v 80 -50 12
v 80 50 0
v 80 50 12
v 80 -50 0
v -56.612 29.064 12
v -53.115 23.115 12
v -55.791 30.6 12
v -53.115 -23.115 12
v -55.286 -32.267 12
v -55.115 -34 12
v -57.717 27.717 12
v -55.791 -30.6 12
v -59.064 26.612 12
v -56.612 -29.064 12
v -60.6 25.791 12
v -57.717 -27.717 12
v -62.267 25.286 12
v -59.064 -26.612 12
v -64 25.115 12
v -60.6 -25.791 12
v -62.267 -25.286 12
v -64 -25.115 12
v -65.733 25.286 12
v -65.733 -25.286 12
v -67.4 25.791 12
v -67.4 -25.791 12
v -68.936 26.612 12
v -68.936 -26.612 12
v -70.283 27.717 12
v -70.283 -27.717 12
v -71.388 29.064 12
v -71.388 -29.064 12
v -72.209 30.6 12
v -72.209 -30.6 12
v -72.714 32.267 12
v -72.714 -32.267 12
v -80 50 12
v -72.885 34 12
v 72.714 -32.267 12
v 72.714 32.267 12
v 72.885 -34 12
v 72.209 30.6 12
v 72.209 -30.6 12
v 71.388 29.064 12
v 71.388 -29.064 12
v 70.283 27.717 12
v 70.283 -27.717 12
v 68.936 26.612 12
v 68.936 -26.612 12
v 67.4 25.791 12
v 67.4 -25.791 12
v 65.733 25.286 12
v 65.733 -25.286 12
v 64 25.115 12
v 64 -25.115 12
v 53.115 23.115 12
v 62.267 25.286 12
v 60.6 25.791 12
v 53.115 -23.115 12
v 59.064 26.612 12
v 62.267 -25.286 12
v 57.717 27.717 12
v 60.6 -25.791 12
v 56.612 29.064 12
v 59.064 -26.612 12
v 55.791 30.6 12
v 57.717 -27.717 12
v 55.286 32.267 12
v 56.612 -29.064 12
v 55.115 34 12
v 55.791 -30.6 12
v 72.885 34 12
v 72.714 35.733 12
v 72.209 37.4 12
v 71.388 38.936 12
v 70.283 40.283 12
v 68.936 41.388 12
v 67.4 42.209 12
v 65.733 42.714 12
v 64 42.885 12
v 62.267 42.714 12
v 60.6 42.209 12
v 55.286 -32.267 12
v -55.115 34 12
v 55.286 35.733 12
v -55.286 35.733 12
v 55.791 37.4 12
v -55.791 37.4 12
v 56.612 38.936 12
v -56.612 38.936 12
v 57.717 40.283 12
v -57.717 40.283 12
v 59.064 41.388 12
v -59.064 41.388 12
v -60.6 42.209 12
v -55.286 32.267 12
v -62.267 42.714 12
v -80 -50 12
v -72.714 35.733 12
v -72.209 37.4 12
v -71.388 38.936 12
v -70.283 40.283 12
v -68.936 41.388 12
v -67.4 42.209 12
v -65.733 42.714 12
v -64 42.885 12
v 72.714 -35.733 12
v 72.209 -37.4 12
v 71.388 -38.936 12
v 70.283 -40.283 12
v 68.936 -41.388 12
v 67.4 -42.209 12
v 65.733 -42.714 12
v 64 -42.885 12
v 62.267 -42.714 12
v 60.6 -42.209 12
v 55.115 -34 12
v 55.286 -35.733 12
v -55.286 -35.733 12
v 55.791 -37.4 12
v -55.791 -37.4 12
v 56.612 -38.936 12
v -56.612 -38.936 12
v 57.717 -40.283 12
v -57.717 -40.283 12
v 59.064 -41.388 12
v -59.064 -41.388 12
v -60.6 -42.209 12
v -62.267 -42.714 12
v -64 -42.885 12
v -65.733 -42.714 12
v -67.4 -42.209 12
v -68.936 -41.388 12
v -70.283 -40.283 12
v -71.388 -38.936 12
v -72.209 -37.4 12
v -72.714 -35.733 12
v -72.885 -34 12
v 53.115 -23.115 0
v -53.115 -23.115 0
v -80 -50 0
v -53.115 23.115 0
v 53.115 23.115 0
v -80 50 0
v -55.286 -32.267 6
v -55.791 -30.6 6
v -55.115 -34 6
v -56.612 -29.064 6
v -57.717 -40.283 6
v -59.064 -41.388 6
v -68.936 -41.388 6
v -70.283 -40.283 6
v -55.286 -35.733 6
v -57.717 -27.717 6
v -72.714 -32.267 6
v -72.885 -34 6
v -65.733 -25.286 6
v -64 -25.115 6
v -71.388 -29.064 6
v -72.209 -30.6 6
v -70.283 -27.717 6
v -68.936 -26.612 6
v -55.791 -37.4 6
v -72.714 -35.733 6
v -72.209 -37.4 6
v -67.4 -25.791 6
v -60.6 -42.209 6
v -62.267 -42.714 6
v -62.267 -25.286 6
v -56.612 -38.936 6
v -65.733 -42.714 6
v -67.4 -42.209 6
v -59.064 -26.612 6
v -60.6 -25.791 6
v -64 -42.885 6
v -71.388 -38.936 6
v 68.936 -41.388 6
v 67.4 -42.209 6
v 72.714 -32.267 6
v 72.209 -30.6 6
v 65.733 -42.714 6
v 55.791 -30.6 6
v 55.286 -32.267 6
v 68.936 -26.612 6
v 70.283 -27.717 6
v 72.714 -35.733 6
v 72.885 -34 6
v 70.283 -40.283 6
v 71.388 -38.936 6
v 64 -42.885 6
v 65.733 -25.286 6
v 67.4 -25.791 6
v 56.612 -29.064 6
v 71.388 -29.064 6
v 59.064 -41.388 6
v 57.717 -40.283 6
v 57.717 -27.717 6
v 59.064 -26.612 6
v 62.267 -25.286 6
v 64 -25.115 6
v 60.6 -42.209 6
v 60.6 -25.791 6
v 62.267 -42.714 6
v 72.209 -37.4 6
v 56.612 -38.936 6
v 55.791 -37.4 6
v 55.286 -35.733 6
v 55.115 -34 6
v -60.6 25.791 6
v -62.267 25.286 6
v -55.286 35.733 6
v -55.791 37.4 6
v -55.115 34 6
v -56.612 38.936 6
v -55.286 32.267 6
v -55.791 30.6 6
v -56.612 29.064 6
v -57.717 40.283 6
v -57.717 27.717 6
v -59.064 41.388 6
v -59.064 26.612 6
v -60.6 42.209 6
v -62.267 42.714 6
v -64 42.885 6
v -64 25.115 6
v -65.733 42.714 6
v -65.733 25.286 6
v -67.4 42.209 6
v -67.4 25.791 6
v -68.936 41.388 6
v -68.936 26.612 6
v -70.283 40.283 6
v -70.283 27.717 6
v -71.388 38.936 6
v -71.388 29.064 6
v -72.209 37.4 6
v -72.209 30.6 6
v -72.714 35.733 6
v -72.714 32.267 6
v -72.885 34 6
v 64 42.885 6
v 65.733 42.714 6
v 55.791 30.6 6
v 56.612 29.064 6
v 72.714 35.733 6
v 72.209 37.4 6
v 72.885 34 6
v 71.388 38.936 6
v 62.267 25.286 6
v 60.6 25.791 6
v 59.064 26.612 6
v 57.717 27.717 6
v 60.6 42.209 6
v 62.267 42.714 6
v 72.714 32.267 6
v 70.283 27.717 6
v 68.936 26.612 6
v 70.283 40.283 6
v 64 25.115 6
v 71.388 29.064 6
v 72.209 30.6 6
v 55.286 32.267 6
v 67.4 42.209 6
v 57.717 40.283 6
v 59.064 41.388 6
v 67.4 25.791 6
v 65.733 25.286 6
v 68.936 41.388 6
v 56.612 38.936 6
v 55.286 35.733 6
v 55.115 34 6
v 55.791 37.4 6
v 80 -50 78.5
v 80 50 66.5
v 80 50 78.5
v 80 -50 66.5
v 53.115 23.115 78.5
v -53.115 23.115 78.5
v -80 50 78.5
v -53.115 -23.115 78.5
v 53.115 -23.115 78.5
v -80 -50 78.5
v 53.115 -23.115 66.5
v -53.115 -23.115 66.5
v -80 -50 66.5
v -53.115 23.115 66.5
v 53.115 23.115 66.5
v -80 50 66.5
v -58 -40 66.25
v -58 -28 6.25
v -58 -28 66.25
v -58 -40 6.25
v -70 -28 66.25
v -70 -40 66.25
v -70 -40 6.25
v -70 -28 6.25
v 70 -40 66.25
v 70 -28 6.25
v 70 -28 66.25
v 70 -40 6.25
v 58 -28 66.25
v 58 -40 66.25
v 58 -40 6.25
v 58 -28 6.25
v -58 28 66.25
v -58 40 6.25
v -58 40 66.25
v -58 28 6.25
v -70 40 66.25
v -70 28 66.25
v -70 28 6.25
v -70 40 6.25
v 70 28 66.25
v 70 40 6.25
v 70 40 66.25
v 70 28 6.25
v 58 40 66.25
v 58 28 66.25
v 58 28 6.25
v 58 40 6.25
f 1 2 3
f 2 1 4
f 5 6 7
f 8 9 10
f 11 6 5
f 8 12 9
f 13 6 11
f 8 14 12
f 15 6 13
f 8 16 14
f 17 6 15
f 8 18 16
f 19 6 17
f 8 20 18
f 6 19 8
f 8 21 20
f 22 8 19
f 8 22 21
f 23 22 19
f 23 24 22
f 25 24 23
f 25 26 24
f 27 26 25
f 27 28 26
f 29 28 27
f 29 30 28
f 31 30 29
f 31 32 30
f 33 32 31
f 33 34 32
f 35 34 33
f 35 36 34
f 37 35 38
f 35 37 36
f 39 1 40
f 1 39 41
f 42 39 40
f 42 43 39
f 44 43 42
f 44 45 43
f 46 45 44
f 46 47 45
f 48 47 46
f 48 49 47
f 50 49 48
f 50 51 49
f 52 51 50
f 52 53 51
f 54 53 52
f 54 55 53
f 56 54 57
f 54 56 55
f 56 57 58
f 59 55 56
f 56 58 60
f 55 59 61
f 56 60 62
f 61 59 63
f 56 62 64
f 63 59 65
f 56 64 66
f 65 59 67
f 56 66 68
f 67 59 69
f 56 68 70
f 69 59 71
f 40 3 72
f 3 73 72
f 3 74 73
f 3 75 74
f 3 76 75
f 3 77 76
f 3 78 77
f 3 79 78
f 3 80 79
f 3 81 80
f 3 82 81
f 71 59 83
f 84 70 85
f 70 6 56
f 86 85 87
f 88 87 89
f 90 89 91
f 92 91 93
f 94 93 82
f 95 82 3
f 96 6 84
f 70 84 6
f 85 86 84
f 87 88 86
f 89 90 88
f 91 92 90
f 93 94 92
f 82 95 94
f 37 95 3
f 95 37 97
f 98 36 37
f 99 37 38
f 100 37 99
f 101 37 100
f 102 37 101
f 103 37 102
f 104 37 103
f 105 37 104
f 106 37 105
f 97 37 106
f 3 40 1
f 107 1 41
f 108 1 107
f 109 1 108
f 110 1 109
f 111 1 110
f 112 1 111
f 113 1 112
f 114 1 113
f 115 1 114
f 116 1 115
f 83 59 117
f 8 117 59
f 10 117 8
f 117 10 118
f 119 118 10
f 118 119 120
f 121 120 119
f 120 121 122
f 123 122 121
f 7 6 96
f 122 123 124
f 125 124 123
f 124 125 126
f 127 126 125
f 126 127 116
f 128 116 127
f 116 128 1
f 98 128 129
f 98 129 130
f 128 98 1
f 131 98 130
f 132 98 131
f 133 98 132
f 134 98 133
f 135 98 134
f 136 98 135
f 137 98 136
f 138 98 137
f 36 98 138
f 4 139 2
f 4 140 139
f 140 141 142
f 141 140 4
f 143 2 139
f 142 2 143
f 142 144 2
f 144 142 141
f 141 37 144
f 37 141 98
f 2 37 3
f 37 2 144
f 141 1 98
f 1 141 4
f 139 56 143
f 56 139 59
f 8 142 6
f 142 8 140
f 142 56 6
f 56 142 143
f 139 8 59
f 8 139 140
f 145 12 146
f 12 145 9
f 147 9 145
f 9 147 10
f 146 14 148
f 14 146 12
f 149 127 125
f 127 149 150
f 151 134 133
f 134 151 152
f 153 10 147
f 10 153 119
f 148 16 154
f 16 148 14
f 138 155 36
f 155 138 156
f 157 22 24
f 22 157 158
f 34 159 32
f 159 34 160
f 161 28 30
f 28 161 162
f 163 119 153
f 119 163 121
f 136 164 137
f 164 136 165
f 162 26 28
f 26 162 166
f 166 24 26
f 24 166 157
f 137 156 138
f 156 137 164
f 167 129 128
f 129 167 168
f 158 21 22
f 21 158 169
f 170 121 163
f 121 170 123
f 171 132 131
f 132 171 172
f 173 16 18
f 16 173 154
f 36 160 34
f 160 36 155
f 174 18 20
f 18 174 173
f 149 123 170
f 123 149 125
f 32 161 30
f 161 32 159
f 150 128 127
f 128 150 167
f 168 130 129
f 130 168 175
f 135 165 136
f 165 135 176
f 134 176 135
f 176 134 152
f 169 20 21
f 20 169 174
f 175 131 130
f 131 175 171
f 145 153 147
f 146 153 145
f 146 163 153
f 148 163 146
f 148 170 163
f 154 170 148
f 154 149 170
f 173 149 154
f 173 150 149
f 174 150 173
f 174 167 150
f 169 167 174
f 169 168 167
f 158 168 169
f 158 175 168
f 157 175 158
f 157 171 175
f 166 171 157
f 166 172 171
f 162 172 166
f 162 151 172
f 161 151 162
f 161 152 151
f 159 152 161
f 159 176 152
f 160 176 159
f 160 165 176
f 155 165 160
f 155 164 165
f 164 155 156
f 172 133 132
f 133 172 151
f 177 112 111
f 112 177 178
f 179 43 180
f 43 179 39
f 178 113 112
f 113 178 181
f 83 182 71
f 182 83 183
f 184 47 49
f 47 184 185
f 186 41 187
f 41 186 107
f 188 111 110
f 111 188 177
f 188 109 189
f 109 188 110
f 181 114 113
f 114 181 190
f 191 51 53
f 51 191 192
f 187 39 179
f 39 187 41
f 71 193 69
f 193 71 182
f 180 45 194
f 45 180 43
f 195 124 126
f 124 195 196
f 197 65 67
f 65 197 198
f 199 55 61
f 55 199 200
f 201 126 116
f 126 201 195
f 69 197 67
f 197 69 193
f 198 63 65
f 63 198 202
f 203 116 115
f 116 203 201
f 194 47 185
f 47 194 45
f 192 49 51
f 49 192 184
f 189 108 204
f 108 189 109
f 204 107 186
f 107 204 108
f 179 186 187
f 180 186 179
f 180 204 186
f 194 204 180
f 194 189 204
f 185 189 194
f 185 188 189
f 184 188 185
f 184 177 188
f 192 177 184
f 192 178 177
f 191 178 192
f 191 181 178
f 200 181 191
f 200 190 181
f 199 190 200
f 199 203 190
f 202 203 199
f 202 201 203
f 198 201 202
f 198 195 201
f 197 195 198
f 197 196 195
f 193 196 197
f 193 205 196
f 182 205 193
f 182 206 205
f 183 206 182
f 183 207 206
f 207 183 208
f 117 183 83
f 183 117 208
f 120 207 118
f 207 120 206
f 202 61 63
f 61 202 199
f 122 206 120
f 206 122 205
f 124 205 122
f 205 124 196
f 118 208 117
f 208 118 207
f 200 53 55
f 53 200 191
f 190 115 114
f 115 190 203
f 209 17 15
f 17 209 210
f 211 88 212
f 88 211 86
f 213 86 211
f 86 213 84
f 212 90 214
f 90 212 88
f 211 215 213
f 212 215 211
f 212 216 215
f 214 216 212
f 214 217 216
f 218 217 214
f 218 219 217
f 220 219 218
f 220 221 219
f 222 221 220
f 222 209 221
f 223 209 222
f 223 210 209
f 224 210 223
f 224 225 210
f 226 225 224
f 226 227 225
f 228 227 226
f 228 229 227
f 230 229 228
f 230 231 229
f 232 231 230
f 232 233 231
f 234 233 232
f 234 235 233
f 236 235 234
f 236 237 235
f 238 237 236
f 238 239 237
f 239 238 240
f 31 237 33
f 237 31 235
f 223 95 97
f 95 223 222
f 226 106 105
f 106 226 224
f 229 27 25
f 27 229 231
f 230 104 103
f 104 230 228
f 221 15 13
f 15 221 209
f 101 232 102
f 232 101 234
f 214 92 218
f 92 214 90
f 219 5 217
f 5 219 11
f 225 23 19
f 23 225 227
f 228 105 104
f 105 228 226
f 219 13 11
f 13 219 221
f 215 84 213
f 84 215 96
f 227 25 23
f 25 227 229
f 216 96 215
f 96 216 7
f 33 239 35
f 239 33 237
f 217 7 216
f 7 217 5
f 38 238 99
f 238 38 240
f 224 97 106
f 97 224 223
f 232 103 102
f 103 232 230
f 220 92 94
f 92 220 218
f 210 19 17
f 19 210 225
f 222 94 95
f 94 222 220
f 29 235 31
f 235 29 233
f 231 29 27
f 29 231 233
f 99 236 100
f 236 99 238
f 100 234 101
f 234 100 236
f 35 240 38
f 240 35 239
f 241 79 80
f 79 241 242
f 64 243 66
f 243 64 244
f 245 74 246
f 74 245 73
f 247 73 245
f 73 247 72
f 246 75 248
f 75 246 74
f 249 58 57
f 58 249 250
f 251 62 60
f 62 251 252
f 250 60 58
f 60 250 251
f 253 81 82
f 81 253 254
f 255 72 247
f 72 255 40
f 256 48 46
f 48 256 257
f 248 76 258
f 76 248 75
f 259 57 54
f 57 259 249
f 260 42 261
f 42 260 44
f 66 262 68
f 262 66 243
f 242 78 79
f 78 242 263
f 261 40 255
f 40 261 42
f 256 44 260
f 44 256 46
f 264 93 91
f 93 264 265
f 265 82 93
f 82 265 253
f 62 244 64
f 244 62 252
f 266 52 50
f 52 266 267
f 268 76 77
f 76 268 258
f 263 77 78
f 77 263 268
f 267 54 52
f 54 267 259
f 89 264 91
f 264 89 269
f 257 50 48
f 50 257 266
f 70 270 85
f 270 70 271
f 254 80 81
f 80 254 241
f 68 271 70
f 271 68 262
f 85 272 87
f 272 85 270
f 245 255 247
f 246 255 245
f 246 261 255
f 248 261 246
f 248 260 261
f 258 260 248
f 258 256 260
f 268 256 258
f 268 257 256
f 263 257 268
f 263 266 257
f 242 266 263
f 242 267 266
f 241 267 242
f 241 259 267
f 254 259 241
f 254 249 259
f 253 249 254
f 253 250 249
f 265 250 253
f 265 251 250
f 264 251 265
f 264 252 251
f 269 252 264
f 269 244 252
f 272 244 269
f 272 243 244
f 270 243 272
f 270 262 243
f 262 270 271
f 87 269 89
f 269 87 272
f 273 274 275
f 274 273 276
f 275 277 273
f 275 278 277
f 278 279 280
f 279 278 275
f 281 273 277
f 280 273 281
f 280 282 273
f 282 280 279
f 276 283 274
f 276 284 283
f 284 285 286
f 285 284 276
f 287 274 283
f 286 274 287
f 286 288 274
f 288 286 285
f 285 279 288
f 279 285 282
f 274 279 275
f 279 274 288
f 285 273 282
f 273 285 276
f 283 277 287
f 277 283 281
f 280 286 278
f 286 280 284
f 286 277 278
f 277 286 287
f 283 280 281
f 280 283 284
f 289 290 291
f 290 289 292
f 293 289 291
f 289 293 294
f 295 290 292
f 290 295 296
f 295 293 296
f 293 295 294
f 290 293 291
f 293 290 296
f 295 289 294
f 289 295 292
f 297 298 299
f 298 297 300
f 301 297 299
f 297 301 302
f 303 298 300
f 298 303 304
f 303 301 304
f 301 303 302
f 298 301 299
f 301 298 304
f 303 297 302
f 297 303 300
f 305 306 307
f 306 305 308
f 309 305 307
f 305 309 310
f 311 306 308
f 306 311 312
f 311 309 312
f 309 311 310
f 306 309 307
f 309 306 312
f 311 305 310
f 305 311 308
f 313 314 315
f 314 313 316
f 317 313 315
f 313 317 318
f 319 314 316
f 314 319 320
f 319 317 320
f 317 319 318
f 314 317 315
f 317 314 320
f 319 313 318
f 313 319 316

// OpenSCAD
$fn = 32;

// ------------------------------------------------------------------------
// Frame cube: base 160 x 100 mm, posts 60 mm tall
// Every part is its own module, assembly() places every instance.
// ------------------------------------------------------------------------

// --- part 1 ---
module base_frame() {
  difference() {
    translate([-80, -50, 0]) cube([160, 100, 12]);
    translate([-53.115, -23.115, -1]) cube([106.23, 46.23, 14]);
    translate([-64, -34, 6]) cylinder(h = 7, d = 17.77);
    translate([64, -34, 6]) cylinder(h = 7, d = 17.77);
    translate([-64, 34, 6]) cylinder(h = 7, d = 17.77);
    translate([64, 34, 6]) cylinder(h = 7, d = 17.77);
  }
}

// --- part 2 ---
module corner_post() {
  translate([-6, -6, 0]) cube([12, 12, 60]);
}

// --- part 3 ---
module top_frame() {
  difference() {
    translate([-80, -50, 0]) cube([160, 100, 12]);
    translate([-53.115, -23.115, -1]) cube([106.23, 46.23, 14]);
  }
}

// --- assembly ---
module assembly() {
  color([0.80, 0.24, 0.20]) translate([0, 0, 0]) rotate([0, 0, 0]) base_frame();
  color([0.20, 0.45, 0.75]) translate([-64, -34, 6.25]) rotate([0, 0, 0]) corner_post();
  color([0.25, 0.62, 0.32]) translate([64, -34, 6.25]) rotate([0, 0, 0]) corner_post();
  color([0.92, 0.70, 0.18]) translate([-64, 34, 6.25]) rotate([0, 0, 0]) corner_post();
  color([0.58, 0.35, 0.70]) translate([64, 34, 6.25]) rotate([0, 0, 0]) corner_post();
  color([0.16, 0.66, 0.66]) translate([0, 0, 66.5]) rotate([0, 0, 0]) top_frame();
}

assembly();
